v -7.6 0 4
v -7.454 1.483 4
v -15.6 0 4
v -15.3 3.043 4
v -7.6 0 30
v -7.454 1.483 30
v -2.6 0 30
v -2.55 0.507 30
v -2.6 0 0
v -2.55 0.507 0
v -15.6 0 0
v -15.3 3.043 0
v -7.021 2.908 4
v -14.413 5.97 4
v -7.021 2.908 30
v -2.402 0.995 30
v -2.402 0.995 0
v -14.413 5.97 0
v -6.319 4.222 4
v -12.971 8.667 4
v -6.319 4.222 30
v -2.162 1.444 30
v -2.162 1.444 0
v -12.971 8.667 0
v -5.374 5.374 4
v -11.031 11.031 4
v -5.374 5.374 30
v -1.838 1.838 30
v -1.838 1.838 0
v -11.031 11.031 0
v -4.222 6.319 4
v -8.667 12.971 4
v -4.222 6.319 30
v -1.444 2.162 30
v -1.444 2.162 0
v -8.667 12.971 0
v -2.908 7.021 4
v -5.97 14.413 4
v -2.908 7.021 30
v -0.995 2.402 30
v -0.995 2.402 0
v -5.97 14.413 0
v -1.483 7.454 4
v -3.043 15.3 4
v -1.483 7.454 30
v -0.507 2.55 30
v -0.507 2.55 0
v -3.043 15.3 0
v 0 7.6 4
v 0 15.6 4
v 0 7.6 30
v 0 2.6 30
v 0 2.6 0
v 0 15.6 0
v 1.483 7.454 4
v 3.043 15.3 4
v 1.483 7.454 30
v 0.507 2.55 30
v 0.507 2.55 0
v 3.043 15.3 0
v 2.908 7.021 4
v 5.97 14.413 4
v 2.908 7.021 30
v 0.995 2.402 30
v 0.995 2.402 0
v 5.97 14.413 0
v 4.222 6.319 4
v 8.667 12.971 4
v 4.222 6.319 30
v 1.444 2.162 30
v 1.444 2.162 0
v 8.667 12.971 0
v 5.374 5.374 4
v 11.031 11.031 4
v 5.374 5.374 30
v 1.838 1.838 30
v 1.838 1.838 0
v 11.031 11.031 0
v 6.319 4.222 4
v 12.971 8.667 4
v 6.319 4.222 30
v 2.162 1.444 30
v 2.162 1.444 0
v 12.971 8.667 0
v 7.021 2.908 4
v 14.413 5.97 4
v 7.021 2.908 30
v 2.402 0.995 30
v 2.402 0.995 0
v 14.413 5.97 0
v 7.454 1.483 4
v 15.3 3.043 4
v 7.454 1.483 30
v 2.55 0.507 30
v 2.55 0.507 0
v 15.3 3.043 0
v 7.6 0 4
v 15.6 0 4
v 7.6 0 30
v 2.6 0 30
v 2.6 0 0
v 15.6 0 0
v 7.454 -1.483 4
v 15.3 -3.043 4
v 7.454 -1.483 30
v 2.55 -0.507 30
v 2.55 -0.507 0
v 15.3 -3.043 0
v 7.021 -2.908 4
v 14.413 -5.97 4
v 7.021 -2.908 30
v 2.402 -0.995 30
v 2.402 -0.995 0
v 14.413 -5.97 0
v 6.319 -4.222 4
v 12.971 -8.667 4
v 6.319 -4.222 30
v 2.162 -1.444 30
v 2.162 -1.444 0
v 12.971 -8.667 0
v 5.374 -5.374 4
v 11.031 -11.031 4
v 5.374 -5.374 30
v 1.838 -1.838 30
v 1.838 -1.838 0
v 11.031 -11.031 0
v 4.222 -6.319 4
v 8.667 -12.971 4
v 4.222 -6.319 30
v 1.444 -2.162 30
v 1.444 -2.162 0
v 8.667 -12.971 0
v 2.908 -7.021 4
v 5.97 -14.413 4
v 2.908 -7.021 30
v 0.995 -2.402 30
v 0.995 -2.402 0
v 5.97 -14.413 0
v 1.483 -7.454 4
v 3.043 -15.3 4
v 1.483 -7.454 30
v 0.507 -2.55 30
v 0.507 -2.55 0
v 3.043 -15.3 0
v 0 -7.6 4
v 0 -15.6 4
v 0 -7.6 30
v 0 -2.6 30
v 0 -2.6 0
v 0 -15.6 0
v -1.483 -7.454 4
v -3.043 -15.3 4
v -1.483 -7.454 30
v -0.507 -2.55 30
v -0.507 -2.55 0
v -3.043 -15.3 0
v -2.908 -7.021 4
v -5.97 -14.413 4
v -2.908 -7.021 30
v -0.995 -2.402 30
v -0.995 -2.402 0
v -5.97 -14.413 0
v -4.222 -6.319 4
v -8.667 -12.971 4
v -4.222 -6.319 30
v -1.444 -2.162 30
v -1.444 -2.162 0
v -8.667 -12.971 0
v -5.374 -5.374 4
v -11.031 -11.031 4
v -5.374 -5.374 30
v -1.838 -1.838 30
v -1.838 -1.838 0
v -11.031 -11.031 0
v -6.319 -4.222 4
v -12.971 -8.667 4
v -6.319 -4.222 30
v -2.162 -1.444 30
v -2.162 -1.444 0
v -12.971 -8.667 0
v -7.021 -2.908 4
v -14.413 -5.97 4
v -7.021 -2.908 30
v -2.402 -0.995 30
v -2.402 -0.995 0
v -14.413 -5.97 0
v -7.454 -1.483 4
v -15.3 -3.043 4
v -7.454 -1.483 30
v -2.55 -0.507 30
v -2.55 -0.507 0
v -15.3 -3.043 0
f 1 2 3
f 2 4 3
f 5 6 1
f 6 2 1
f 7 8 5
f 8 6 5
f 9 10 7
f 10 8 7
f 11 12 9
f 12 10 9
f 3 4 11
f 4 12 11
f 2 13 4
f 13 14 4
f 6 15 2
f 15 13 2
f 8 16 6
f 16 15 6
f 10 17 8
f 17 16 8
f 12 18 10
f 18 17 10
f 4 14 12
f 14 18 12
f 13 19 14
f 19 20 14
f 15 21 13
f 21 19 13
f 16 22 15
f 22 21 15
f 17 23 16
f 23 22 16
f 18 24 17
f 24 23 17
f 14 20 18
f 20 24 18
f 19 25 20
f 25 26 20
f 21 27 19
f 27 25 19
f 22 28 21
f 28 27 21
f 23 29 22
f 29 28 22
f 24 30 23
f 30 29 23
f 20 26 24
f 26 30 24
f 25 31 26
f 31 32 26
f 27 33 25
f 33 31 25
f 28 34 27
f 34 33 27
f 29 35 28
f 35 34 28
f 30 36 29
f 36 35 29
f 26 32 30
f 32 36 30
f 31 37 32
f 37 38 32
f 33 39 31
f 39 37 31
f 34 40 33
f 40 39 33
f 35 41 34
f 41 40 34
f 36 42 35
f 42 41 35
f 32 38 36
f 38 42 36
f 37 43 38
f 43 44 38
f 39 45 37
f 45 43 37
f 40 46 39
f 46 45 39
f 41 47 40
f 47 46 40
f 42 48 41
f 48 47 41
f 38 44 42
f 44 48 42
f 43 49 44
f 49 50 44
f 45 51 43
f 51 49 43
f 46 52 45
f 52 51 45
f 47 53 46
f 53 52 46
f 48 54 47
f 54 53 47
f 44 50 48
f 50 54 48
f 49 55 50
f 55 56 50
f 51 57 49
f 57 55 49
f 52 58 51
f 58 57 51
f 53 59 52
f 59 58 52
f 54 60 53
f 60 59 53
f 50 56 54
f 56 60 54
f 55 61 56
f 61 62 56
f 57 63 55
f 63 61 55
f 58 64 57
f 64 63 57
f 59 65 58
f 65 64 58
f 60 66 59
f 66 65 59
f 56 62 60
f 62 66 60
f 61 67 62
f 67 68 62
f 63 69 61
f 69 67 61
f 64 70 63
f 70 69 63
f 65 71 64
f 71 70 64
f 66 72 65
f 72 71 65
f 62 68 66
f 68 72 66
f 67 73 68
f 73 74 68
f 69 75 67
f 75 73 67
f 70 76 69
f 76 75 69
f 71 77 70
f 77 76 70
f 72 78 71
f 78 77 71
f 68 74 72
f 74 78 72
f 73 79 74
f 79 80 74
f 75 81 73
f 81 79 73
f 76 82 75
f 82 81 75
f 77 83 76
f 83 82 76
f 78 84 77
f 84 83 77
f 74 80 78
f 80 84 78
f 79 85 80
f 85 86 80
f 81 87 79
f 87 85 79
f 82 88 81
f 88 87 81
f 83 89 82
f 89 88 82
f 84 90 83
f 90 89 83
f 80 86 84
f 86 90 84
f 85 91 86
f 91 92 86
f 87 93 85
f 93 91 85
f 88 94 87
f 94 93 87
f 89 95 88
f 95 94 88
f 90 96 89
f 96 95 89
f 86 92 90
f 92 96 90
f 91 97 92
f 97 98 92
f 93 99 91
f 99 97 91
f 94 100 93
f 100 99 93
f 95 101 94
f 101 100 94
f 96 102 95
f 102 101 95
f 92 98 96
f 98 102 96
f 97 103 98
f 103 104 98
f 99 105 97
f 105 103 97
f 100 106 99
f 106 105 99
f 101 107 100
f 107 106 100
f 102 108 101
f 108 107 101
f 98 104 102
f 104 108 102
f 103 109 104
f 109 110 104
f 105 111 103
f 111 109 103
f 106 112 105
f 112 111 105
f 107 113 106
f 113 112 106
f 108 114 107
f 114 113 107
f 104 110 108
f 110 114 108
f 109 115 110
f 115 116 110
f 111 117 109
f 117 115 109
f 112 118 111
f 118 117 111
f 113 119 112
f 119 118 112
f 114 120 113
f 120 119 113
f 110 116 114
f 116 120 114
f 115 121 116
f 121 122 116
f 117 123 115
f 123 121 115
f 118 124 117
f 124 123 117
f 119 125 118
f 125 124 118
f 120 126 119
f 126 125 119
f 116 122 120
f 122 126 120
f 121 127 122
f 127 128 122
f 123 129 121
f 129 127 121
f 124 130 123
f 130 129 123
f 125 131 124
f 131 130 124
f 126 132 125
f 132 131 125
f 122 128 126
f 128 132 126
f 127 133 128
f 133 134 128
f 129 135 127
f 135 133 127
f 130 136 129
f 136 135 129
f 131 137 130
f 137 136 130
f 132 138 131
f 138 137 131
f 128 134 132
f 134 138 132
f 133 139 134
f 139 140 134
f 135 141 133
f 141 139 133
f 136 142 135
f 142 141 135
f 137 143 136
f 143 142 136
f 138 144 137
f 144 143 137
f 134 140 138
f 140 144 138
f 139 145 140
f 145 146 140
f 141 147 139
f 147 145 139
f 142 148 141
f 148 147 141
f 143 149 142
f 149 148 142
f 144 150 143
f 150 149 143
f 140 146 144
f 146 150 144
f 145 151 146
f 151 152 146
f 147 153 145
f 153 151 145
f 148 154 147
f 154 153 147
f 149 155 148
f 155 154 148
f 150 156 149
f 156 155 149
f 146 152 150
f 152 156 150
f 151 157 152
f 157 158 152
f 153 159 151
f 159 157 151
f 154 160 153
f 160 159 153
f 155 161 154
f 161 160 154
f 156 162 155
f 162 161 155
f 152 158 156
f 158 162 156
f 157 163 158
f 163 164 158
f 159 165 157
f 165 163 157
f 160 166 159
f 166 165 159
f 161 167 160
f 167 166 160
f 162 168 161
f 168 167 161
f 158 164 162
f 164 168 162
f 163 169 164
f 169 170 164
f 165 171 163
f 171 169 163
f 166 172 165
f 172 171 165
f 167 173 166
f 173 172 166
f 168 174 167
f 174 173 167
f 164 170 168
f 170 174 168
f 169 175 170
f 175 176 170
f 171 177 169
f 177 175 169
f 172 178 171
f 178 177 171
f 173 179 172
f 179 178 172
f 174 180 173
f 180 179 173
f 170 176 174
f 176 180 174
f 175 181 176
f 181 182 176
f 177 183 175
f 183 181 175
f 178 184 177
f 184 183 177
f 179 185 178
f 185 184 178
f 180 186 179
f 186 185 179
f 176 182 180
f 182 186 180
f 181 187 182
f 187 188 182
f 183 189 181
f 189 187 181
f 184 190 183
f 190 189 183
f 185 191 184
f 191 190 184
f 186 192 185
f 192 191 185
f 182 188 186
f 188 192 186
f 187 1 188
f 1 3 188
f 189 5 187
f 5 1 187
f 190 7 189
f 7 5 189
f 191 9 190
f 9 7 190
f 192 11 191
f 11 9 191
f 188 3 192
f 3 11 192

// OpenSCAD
$fn = 32;

// ----------------------------------------------------------------------
// Profiled standoff: flanged spacer, 30 mm long, bore 5.2 mm
// ----------------------------------------------------------------------

// --- parameters (mm) ---
revolve_angle = 360;      // full turn around the Z axis
profile_points = 6;       // points of the closed outline

profile = [[2.6, 0], [15.6, 0], [15.6, 4], [7.6, 4], [7.6, 30], [2.6, 30]];  // single closed polygon, 6 points, counter clockwise

// --- the one profile operation ---
rotate_extrude(angle = revolve_angle) polygon(points = profile);
